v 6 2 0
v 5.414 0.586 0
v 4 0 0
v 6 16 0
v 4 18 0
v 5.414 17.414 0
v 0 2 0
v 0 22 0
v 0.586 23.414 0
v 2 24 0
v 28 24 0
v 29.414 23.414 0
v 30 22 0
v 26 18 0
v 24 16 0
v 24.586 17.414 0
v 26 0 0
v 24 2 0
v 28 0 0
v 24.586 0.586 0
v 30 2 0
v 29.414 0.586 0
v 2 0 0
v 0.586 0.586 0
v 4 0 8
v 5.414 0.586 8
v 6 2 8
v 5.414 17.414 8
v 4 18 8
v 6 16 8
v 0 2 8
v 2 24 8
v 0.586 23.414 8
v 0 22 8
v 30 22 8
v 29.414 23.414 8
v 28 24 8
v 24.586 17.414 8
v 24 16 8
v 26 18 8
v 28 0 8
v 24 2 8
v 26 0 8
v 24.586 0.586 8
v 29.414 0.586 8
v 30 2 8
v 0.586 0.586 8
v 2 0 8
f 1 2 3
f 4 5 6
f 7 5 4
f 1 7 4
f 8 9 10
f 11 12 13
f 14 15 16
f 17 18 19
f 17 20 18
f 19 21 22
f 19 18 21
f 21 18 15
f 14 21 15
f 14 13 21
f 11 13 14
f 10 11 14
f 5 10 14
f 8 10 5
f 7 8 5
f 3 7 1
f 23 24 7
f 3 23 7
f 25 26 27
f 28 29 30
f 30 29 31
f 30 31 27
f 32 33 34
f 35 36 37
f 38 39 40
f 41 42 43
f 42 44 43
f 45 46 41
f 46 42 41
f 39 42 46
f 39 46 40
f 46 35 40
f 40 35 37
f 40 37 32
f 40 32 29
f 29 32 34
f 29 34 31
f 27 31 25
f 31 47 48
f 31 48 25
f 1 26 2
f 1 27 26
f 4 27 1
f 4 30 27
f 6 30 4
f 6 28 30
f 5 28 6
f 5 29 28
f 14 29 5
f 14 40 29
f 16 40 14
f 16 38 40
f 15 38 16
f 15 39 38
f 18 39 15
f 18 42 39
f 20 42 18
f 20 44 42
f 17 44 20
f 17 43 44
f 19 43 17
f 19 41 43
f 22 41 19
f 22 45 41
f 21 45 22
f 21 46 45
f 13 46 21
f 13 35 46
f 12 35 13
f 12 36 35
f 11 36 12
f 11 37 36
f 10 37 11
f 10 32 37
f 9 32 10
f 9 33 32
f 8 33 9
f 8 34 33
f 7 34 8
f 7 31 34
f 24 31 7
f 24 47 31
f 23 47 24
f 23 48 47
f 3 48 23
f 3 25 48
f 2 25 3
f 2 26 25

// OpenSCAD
$fn = 32;

// ----------------------------------------------------------------------
// Clip blank: staple clip, 8 mm thick
// ----------------------------------------------------------------------

// --- parameters (mm) ---
profile_height = 8;       // extrusion height
profile_points = 24;      // points of the closed outline

profile = [[0, 2], [0.586, 0.586], [2, 0], [4, 0], [5.414, 0.586], [6, 2], [6, 16], [5.414, 17.414], [4, 18], [26, 18], [24.586, 17.414], [24, 16], [24, 2], [24.586, 0.586], [26, 0], [28, 0], [29.414, 0.586], [30, 2], [30, 22], [29.414, 23.414], [28, 24], [2, 24], [0.586, 23.414], [0, 22]];  // single closed polygon, 24 points, counter clockwise

// --- the one profile operation ---
linear_extrude(height = profile_height) polygon(points = profile);
